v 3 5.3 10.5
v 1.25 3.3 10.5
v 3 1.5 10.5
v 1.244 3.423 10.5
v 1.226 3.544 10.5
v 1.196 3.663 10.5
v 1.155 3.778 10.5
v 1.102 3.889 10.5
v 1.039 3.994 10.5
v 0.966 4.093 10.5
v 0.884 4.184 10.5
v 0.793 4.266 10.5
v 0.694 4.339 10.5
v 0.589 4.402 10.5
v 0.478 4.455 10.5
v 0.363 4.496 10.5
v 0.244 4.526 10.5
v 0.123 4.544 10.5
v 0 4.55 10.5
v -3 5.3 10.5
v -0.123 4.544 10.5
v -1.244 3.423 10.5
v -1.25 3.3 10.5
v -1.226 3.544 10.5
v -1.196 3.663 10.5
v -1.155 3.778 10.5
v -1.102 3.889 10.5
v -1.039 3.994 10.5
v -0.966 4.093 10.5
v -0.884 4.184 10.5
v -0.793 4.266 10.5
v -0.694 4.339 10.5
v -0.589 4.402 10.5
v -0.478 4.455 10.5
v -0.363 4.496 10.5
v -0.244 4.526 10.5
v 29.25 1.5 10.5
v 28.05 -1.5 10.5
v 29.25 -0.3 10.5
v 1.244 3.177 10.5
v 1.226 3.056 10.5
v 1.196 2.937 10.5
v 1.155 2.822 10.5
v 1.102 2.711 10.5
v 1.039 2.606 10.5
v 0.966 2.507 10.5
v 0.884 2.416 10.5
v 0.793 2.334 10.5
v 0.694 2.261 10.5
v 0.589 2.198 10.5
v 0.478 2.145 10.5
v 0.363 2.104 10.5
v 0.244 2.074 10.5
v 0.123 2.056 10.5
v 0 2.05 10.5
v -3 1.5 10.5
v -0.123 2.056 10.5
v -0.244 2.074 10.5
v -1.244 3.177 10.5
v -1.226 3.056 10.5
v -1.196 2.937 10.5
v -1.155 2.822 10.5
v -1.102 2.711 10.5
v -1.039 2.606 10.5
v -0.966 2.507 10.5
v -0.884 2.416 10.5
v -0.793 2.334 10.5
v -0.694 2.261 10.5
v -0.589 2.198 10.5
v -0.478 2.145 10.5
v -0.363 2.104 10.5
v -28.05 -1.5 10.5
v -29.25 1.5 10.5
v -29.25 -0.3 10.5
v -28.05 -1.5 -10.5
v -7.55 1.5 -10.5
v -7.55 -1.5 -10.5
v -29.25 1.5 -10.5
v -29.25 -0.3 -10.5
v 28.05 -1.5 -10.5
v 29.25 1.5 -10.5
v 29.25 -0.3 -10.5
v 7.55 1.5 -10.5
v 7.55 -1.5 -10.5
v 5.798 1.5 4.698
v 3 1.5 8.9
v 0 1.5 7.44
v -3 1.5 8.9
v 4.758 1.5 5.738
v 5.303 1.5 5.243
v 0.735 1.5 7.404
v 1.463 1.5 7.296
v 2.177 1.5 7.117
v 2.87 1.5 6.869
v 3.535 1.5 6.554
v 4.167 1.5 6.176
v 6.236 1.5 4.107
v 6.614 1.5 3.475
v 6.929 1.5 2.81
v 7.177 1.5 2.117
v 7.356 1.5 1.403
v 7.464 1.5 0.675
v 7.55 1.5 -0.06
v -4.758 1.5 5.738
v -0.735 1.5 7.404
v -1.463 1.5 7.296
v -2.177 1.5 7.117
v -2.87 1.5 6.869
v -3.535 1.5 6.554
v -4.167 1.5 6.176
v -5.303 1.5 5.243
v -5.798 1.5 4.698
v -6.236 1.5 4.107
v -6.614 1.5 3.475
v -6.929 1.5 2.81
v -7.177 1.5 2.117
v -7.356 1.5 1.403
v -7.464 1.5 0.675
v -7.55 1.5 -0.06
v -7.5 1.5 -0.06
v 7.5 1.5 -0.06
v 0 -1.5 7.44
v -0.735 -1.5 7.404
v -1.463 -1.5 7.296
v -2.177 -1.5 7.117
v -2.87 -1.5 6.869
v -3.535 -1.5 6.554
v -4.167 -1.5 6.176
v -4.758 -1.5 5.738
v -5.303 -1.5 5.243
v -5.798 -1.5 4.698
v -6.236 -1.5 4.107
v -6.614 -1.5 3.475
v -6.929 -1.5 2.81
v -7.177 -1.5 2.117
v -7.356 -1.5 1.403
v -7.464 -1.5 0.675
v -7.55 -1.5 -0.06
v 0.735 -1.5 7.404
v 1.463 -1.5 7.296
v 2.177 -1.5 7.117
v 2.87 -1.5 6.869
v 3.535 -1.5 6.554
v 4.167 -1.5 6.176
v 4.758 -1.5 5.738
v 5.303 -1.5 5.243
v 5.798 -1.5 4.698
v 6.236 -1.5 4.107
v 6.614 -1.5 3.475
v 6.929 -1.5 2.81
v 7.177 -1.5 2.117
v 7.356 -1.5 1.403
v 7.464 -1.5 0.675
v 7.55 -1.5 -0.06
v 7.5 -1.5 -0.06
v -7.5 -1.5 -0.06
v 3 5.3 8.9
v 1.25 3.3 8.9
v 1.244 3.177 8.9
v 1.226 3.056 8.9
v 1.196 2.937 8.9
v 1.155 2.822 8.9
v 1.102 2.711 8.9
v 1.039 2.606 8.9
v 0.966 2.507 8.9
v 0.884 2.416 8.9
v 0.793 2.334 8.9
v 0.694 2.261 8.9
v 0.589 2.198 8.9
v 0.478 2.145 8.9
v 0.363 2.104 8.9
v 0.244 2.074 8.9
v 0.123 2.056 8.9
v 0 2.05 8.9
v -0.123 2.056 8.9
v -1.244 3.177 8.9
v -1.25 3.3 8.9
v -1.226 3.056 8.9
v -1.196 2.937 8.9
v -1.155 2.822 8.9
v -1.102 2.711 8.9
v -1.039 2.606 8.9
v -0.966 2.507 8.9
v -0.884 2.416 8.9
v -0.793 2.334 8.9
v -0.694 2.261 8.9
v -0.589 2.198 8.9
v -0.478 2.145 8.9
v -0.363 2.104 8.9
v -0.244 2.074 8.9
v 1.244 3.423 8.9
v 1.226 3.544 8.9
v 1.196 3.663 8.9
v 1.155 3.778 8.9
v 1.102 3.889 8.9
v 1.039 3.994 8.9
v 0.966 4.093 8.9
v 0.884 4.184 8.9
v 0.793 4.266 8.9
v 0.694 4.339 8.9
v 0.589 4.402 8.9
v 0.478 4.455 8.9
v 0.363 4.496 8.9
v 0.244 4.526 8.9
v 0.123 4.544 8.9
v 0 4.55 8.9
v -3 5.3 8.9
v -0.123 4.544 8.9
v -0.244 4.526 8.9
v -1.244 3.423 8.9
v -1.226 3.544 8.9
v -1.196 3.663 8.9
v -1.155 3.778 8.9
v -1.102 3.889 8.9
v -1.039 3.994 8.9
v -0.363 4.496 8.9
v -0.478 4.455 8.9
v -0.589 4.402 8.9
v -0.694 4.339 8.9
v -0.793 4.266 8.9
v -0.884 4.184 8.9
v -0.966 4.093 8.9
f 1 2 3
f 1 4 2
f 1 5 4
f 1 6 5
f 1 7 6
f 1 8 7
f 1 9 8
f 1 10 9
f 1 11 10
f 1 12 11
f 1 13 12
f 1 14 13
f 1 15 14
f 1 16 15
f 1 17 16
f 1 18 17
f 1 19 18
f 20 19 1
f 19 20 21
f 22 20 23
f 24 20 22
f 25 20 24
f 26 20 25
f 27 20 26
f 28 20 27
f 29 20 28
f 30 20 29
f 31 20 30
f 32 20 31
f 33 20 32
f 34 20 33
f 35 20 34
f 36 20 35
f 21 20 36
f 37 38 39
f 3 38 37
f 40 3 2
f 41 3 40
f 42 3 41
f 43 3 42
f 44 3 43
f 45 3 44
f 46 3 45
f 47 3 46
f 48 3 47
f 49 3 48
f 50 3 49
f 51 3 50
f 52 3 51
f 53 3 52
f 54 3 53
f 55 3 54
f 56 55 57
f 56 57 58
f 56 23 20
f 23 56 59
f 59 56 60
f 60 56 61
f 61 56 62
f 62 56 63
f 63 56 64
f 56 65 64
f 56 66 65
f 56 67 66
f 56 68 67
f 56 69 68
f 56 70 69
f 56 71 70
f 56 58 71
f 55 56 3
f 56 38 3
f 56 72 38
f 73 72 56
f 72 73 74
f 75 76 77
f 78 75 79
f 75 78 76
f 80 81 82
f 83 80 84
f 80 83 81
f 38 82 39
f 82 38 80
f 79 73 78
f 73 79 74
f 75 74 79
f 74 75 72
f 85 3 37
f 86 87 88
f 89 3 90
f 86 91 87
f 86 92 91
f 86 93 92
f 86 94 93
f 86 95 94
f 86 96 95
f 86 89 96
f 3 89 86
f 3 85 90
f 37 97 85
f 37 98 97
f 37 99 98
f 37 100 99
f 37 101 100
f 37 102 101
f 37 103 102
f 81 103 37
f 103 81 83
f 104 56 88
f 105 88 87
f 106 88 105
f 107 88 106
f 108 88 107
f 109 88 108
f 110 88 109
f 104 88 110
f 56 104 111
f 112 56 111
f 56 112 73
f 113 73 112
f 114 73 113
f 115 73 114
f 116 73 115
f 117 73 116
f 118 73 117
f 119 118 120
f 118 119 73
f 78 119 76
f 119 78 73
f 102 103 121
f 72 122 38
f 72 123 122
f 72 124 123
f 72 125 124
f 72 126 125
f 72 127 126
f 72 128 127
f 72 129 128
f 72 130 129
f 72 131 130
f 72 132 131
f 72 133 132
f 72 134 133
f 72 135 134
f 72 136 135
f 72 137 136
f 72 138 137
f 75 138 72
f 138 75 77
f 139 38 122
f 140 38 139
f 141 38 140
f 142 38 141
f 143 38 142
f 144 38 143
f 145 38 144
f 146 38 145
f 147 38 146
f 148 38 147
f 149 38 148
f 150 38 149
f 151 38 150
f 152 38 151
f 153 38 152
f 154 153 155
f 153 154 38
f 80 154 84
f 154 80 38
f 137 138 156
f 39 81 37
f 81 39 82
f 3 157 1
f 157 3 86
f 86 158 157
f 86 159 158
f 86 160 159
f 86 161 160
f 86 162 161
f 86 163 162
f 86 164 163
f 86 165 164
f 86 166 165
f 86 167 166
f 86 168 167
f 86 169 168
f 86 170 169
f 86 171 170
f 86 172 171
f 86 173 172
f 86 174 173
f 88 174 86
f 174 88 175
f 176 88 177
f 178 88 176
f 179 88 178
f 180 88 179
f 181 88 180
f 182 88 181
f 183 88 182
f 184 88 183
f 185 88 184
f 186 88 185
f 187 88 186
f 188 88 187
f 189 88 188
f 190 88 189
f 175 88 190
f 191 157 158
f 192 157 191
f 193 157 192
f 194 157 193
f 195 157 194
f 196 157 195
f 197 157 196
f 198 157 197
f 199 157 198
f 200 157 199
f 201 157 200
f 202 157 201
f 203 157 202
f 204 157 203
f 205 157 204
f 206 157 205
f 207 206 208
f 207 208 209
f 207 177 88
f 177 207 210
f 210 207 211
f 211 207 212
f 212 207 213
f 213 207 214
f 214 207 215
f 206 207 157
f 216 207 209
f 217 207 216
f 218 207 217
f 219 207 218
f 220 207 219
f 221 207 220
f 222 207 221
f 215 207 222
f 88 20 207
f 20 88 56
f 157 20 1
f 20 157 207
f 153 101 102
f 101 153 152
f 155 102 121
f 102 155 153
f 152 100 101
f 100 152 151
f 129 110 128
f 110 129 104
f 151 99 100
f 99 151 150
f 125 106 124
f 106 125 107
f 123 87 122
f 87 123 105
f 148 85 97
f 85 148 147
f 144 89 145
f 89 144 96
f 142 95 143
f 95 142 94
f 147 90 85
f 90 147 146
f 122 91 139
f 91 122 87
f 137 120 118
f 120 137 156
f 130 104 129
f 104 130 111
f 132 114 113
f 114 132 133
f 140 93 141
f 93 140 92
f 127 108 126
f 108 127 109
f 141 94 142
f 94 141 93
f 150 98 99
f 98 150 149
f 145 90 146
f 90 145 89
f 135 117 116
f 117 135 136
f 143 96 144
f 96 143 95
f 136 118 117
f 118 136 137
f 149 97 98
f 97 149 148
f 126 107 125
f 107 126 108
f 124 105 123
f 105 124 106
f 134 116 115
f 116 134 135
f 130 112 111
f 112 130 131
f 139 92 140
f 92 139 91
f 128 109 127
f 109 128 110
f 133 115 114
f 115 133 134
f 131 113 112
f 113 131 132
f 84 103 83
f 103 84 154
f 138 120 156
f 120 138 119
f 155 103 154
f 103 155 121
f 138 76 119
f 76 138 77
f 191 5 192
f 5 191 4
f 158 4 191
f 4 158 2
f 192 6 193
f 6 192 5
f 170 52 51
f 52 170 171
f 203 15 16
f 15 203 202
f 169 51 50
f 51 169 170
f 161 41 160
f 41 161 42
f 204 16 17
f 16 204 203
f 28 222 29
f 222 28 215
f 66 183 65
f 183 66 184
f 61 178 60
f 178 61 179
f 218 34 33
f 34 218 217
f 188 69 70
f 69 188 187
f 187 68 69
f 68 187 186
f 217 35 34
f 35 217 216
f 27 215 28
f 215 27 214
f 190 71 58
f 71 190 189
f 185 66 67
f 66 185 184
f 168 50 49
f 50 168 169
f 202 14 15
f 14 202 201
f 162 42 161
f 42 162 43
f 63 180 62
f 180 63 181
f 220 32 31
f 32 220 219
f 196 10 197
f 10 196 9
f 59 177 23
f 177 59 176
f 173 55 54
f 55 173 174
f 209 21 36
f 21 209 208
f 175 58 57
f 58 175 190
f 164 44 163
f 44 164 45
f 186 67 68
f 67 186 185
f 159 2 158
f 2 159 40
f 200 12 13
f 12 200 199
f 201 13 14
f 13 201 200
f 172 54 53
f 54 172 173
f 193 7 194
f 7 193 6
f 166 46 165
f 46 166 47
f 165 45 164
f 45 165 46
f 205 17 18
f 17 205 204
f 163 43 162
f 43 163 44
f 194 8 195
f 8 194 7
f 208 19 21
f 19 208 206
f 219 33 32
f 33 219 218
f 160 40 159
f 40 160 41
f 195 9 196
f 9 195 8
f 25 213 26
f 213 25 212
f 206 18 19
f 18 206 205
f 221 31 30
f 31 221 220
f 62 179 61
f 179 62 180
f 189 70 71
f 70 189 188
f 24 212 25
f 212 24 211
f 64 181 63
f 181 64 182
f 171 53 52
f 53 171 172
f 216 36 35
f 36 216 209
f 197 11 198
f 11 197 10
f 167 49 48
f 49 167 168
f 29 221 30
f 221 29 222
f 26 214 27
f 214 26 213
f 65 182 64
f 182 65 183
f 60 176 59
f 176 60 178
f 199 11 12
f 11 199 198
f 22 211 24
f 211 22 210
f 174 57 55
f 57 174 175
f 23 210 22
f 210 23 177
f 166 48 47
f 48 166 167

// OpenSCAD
// DOUBLE TAKE FRAMES DESIGN RELEASE
// DTF_RELEASE: 1.0.0
// Released: 2026-08-30
// Versioning: Semantic Versioning 2.0.0 (https://semver.org/)
// Status: CANONICAL
// Changes in 1.0.0:
// - Initial versioned public design release.
// - Establishes the current accepted geometry as the 1.x compatibility baseline.
// Full release notes: https://doubletakeframes.com/build/#design-release
//
// =========================================================
// SEPARATE OBJECT: CLOCK +Y PRESSURE BAR TEST
// Horizontal tension-fit bar.
// Pressure is at X ends.
// Center winding-nub clearance hole.
// Integrated string-feed boss with vertical hole.
// =========================================================

$fn = 64;
eps = 0.05;

// ---------- bar knobs ----------

clock_bar_len_x = 58.5;
clock_bar_t_y   = 3.0;
clock_bar_h_z   = 21.0;

clock_bar_hole_d = 15;
clock_bar_hole_z_offset = -.06;   // negative = lower, positive = higher

// chamfered X-end corners, seen from TOP VIEW
// max useful value is just under clock_bar_t_y/2
end_chamfer_y = 1.2;


// ---------- integrated string-feed boss ----------
// Bigger boss, kept just at +Y rim of center hole

string_boss_w_x = 6.0;
string_boss_d_y = 4.0;
string_boss_h_z = 1.6;

string_hole_d = 2.5;

string_boss_xc = 0;

// front face sits at +Y rim of center hole
string_boss_y0 = clock_bar_t_y/2 - 0.2;

string_boss_z0 = clock_bar_h_z/2 - string_boss_h_z;

string_hole_xc = string_boss_xc;
string_hole_yc = string_boss_y0 + string_boss_d_y/2;

// =========================================================

module chamfered_bar_body(){

    linear_extrude(height = clock_bar_h_z, center = true)
        polygon(points = [
            // bottom / -Y edge, with chamfered insertion corners
            [-clock_bar_len_x/2 + end_chamfer_y, -clock_bar_t_y/2],
            [ clock_bar_len_x/2 - end_chamfer_y, -clock_bar_t_y/2],

            // right / +X end
            [ clock_bar_len_x/2, -clock_bar_t_y/2 + end_chamfer_y],
            [ clock_bar_len_x/2,  clock_bar_t_y/2],

            // top / +Y edge stays square
            [-clock_bar_len_x/2,  clock_bar_t_y/2],

            // left / -X end
            [-clock_bar_len_x/2, -clock_bar_t_y/2 + end_chamfer_y]
        ]);
}

module clock_pressure_bar(){

    difference(){

        union(){

            // main bar with true X-end corner chamfers
            chamfered_bar_body();

            // integrated +Y string-feed boss
            translate([
                string_boss_xc - string_boss_w_x/2,
                string_boss_y0,
                string_boss_z0
            ])
                cube([
                    string_boss_w_x,
                    string_boss_d_y,
                    string_boss_h_z
                ]);
        }

// center hole for winding nub, through Y
translate([0, 0, clock_bar_hole_z_offset])
    rotate([90,0,0])
        cylinder(
            h = clock_bar_t_y + string_boss_d_y + 2,
            d = clock_bar_hole_d,
            center = true
        );

// kill/open everything below the hole diameter
translate([
    -clock_bar_hole_d/2 - eps,
    -clock_bar_t_y/2 - string_boss_d_y - eps,
    -clock_bar_h_z/2 - eps
])
    cube([
        clock_bar_hole_d + 2*eps,
        clock_bar_t_y + string_boss_d_y + 2*eps,
        clock_bar_h_z/2 + clock_bar_hole_z_offset + eps
    ]);

        // vertical string-feed hole
        translate([
            string_hole_xc,
            string_hole_yc,
            string_boss_z0 - 0.4
        ])
            cylinder(
                h = string_boss_h_z + 0.8 + 2*eps,
                d = string_hole_d,
                center = false
            );
    }
}

clock_pressure_bar();
